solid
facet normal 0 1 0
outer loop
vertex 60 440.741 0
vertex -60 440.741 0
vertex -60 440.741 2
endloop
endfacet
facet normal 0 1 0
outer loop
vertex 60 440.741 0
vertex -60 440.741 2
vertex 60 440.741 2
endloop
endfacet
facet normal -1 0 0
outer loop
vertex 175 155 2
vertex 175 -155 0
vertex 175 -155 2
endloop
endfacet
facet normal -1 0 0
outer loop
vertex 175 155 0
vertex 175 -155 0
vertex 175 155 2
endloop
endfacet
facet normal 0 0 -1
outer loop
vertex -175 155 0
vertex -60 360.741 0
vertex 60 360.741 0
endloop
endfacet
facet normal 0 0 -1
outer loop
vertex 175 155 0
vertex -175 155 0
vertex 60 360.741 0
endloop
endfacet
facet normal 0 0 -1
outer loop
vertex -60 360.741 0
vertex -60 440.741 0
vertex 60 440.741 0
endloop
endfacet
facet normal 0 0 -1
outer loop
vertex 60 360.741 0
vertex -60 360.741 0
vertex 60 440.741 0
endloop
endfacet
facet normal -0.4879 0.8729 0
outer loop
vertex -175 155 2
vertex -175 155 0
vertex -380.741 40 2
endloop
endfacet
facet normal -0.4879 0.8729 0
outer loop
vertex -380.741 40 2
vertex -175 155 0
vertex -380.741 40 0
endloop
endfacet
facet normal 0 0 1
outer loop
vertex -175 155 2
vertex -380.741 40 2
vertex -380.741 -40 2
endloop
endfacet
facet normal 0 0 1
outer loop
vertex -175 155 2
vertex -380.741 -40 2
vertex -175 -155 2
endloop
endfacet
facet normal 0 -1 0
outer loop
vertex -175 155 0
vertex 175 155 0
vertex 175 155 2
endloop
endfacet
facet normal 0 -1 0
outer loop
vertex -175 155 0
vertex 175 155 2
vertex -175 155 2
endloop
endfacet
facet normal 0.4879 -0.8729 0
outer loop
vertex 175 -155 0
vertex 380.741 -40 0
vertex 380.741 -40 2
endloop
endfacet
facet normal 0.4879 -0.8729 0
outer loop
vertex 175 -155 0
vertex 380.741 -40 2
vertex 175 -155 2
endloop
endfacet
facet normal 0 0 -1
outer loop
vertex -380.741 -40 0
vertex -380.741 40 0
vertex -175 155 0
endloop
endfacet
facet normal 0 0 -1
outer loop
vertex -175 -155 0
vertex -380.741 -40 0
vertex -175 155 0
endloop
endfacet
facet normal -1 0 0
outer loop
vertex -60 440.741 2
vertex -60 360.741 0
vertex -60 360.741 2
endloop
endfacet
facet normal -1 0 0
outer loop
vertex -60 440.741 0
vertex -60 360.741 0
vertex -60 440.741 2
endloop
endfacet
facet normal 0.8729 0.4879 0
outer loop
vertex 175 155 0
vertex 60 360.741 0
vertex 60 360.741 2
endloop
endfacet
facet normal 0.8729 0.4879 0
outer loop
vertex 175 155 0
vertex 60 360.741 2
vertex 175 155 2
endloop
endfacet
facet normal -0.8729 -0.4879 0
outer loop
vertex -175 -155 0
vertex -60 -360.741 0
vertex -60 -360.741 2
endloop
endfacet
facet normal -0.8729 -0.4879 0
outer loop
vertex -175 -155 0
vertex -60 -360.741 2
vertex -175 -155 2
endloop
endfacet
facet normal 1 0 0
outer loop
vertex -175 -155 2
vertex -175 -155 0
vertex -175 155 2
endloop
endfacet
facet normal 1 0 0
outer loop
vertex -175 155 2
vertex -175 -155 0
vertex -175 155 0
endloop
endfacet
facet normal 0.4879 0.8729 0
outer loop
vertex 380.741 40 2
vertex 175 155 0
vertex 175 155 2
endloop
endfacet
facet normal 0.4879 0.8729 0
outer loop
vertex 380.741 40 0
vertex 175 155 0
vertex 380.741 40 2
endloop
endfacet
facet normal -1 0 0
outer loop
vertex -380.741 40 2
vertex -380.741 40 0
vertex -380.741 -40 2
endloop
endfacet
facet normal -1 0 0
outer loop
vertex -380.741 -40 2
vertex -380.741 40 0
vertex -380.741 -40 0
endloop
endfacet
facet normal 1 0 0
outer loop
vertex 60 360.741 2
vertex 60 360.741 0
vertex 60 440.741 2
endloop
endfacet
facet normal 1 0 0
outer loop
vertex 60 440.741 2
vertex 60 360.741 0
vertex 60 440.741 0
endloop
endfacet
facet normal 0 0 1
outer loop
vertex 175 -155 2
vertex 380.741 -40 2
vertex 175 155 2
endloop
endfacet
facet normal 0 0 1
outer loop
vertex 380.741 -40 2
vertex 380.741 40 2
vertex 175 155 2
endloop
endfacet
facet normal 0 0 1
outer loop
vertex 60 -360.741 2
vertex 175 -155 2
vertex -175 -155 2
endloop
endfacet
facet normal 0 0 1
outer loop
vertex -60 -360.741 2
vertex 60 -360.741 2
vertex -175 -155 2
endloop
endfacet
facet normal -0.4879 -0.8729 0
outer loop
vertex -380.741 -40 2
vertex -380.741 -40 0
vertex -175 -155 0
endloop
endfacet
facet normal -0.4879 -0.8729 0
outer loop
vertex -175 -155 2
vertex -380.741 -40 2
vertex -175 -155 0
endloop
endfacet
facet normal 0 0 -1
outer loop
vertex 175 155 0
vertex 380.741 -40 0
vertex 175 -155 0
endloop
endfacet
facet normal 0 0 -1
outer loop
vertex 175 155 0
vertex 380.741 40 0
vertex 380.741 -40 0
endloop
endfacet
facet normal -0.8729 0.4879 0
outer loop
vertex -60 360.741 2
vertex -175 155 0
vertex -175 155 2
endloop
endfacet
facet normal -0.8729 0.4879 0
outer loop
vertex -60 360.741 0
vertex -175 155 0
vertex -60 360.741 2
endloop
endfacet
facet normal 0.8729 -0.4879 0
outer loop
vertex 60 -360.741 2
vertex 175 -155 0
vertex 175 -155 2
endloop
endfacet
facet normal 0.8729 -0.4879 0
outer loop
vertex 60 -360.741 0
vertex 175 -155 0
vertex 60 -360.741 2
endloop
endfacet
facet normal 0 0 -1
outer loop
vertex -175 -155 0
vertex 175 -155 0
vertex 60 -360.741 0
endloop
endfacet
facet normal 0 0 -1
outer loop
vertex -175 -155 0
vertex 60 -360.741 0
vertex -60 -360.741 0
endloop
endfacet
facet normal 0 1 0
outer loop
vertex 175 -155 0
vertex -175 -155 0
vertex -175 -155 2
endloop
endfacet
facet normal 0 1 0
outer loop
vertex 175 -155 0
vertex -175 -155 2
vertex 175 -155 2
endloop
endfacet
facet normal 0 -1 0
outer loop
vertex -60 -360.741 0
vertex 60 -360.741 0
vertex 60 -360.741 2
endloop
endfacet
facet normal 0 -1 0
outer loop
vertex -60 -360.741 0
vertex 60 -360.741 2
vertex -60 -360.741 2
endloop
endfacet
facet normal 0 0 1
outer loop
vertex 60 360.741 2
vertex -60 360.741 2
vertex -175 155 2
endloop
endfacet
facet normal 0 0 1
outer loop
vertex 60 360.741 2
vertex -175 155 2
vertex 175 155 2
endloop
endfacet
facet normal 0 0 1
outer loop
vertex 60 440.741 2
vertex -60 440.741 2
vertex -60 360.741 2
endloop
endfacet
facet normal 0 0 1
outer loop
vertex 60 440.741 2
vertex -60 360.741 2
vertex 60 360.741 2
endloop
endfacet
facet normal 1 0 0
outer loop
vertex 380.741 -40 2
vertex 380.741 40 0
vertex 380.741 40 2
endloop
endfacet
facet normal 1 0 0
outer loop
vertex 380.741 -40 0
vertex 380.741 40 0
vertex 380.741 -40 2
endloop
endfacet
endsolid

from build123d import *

# Parameters (mm, degrees)
SKETCH1_W           = 120
SKETCH1_H           = 80
BOSS_EXTRUDE2_DEPTH = 2


with BuildPart() as part:
    # Sketch1 → Boss-Extrude2 (new body)
    with BuildSketch(Plane.XY):
        with Locations((0, 400.741318164)):
            Rectangle(SKETCH1_W, SKETCH1_H)
        Polygon((60, 360.741318164), (175, 155), (-175, 155), (-60, 360.741318164), align=None)
        Polygon((380.741318164, -40), (175, -155), (175, 155), (380.741318164, 40), align=None)
        Polygon((-60, -360.741318164), (-175, -155), (175, -155), (60, -360.741318164), align=None)
        Polygon((-175, -155), (-175, 155), (-380.741318164, 40), (-380.741318164, -40), align=None)
    extrude(amount=BOSS_EXTRUDE2_DEPTH)


solid = part.part
